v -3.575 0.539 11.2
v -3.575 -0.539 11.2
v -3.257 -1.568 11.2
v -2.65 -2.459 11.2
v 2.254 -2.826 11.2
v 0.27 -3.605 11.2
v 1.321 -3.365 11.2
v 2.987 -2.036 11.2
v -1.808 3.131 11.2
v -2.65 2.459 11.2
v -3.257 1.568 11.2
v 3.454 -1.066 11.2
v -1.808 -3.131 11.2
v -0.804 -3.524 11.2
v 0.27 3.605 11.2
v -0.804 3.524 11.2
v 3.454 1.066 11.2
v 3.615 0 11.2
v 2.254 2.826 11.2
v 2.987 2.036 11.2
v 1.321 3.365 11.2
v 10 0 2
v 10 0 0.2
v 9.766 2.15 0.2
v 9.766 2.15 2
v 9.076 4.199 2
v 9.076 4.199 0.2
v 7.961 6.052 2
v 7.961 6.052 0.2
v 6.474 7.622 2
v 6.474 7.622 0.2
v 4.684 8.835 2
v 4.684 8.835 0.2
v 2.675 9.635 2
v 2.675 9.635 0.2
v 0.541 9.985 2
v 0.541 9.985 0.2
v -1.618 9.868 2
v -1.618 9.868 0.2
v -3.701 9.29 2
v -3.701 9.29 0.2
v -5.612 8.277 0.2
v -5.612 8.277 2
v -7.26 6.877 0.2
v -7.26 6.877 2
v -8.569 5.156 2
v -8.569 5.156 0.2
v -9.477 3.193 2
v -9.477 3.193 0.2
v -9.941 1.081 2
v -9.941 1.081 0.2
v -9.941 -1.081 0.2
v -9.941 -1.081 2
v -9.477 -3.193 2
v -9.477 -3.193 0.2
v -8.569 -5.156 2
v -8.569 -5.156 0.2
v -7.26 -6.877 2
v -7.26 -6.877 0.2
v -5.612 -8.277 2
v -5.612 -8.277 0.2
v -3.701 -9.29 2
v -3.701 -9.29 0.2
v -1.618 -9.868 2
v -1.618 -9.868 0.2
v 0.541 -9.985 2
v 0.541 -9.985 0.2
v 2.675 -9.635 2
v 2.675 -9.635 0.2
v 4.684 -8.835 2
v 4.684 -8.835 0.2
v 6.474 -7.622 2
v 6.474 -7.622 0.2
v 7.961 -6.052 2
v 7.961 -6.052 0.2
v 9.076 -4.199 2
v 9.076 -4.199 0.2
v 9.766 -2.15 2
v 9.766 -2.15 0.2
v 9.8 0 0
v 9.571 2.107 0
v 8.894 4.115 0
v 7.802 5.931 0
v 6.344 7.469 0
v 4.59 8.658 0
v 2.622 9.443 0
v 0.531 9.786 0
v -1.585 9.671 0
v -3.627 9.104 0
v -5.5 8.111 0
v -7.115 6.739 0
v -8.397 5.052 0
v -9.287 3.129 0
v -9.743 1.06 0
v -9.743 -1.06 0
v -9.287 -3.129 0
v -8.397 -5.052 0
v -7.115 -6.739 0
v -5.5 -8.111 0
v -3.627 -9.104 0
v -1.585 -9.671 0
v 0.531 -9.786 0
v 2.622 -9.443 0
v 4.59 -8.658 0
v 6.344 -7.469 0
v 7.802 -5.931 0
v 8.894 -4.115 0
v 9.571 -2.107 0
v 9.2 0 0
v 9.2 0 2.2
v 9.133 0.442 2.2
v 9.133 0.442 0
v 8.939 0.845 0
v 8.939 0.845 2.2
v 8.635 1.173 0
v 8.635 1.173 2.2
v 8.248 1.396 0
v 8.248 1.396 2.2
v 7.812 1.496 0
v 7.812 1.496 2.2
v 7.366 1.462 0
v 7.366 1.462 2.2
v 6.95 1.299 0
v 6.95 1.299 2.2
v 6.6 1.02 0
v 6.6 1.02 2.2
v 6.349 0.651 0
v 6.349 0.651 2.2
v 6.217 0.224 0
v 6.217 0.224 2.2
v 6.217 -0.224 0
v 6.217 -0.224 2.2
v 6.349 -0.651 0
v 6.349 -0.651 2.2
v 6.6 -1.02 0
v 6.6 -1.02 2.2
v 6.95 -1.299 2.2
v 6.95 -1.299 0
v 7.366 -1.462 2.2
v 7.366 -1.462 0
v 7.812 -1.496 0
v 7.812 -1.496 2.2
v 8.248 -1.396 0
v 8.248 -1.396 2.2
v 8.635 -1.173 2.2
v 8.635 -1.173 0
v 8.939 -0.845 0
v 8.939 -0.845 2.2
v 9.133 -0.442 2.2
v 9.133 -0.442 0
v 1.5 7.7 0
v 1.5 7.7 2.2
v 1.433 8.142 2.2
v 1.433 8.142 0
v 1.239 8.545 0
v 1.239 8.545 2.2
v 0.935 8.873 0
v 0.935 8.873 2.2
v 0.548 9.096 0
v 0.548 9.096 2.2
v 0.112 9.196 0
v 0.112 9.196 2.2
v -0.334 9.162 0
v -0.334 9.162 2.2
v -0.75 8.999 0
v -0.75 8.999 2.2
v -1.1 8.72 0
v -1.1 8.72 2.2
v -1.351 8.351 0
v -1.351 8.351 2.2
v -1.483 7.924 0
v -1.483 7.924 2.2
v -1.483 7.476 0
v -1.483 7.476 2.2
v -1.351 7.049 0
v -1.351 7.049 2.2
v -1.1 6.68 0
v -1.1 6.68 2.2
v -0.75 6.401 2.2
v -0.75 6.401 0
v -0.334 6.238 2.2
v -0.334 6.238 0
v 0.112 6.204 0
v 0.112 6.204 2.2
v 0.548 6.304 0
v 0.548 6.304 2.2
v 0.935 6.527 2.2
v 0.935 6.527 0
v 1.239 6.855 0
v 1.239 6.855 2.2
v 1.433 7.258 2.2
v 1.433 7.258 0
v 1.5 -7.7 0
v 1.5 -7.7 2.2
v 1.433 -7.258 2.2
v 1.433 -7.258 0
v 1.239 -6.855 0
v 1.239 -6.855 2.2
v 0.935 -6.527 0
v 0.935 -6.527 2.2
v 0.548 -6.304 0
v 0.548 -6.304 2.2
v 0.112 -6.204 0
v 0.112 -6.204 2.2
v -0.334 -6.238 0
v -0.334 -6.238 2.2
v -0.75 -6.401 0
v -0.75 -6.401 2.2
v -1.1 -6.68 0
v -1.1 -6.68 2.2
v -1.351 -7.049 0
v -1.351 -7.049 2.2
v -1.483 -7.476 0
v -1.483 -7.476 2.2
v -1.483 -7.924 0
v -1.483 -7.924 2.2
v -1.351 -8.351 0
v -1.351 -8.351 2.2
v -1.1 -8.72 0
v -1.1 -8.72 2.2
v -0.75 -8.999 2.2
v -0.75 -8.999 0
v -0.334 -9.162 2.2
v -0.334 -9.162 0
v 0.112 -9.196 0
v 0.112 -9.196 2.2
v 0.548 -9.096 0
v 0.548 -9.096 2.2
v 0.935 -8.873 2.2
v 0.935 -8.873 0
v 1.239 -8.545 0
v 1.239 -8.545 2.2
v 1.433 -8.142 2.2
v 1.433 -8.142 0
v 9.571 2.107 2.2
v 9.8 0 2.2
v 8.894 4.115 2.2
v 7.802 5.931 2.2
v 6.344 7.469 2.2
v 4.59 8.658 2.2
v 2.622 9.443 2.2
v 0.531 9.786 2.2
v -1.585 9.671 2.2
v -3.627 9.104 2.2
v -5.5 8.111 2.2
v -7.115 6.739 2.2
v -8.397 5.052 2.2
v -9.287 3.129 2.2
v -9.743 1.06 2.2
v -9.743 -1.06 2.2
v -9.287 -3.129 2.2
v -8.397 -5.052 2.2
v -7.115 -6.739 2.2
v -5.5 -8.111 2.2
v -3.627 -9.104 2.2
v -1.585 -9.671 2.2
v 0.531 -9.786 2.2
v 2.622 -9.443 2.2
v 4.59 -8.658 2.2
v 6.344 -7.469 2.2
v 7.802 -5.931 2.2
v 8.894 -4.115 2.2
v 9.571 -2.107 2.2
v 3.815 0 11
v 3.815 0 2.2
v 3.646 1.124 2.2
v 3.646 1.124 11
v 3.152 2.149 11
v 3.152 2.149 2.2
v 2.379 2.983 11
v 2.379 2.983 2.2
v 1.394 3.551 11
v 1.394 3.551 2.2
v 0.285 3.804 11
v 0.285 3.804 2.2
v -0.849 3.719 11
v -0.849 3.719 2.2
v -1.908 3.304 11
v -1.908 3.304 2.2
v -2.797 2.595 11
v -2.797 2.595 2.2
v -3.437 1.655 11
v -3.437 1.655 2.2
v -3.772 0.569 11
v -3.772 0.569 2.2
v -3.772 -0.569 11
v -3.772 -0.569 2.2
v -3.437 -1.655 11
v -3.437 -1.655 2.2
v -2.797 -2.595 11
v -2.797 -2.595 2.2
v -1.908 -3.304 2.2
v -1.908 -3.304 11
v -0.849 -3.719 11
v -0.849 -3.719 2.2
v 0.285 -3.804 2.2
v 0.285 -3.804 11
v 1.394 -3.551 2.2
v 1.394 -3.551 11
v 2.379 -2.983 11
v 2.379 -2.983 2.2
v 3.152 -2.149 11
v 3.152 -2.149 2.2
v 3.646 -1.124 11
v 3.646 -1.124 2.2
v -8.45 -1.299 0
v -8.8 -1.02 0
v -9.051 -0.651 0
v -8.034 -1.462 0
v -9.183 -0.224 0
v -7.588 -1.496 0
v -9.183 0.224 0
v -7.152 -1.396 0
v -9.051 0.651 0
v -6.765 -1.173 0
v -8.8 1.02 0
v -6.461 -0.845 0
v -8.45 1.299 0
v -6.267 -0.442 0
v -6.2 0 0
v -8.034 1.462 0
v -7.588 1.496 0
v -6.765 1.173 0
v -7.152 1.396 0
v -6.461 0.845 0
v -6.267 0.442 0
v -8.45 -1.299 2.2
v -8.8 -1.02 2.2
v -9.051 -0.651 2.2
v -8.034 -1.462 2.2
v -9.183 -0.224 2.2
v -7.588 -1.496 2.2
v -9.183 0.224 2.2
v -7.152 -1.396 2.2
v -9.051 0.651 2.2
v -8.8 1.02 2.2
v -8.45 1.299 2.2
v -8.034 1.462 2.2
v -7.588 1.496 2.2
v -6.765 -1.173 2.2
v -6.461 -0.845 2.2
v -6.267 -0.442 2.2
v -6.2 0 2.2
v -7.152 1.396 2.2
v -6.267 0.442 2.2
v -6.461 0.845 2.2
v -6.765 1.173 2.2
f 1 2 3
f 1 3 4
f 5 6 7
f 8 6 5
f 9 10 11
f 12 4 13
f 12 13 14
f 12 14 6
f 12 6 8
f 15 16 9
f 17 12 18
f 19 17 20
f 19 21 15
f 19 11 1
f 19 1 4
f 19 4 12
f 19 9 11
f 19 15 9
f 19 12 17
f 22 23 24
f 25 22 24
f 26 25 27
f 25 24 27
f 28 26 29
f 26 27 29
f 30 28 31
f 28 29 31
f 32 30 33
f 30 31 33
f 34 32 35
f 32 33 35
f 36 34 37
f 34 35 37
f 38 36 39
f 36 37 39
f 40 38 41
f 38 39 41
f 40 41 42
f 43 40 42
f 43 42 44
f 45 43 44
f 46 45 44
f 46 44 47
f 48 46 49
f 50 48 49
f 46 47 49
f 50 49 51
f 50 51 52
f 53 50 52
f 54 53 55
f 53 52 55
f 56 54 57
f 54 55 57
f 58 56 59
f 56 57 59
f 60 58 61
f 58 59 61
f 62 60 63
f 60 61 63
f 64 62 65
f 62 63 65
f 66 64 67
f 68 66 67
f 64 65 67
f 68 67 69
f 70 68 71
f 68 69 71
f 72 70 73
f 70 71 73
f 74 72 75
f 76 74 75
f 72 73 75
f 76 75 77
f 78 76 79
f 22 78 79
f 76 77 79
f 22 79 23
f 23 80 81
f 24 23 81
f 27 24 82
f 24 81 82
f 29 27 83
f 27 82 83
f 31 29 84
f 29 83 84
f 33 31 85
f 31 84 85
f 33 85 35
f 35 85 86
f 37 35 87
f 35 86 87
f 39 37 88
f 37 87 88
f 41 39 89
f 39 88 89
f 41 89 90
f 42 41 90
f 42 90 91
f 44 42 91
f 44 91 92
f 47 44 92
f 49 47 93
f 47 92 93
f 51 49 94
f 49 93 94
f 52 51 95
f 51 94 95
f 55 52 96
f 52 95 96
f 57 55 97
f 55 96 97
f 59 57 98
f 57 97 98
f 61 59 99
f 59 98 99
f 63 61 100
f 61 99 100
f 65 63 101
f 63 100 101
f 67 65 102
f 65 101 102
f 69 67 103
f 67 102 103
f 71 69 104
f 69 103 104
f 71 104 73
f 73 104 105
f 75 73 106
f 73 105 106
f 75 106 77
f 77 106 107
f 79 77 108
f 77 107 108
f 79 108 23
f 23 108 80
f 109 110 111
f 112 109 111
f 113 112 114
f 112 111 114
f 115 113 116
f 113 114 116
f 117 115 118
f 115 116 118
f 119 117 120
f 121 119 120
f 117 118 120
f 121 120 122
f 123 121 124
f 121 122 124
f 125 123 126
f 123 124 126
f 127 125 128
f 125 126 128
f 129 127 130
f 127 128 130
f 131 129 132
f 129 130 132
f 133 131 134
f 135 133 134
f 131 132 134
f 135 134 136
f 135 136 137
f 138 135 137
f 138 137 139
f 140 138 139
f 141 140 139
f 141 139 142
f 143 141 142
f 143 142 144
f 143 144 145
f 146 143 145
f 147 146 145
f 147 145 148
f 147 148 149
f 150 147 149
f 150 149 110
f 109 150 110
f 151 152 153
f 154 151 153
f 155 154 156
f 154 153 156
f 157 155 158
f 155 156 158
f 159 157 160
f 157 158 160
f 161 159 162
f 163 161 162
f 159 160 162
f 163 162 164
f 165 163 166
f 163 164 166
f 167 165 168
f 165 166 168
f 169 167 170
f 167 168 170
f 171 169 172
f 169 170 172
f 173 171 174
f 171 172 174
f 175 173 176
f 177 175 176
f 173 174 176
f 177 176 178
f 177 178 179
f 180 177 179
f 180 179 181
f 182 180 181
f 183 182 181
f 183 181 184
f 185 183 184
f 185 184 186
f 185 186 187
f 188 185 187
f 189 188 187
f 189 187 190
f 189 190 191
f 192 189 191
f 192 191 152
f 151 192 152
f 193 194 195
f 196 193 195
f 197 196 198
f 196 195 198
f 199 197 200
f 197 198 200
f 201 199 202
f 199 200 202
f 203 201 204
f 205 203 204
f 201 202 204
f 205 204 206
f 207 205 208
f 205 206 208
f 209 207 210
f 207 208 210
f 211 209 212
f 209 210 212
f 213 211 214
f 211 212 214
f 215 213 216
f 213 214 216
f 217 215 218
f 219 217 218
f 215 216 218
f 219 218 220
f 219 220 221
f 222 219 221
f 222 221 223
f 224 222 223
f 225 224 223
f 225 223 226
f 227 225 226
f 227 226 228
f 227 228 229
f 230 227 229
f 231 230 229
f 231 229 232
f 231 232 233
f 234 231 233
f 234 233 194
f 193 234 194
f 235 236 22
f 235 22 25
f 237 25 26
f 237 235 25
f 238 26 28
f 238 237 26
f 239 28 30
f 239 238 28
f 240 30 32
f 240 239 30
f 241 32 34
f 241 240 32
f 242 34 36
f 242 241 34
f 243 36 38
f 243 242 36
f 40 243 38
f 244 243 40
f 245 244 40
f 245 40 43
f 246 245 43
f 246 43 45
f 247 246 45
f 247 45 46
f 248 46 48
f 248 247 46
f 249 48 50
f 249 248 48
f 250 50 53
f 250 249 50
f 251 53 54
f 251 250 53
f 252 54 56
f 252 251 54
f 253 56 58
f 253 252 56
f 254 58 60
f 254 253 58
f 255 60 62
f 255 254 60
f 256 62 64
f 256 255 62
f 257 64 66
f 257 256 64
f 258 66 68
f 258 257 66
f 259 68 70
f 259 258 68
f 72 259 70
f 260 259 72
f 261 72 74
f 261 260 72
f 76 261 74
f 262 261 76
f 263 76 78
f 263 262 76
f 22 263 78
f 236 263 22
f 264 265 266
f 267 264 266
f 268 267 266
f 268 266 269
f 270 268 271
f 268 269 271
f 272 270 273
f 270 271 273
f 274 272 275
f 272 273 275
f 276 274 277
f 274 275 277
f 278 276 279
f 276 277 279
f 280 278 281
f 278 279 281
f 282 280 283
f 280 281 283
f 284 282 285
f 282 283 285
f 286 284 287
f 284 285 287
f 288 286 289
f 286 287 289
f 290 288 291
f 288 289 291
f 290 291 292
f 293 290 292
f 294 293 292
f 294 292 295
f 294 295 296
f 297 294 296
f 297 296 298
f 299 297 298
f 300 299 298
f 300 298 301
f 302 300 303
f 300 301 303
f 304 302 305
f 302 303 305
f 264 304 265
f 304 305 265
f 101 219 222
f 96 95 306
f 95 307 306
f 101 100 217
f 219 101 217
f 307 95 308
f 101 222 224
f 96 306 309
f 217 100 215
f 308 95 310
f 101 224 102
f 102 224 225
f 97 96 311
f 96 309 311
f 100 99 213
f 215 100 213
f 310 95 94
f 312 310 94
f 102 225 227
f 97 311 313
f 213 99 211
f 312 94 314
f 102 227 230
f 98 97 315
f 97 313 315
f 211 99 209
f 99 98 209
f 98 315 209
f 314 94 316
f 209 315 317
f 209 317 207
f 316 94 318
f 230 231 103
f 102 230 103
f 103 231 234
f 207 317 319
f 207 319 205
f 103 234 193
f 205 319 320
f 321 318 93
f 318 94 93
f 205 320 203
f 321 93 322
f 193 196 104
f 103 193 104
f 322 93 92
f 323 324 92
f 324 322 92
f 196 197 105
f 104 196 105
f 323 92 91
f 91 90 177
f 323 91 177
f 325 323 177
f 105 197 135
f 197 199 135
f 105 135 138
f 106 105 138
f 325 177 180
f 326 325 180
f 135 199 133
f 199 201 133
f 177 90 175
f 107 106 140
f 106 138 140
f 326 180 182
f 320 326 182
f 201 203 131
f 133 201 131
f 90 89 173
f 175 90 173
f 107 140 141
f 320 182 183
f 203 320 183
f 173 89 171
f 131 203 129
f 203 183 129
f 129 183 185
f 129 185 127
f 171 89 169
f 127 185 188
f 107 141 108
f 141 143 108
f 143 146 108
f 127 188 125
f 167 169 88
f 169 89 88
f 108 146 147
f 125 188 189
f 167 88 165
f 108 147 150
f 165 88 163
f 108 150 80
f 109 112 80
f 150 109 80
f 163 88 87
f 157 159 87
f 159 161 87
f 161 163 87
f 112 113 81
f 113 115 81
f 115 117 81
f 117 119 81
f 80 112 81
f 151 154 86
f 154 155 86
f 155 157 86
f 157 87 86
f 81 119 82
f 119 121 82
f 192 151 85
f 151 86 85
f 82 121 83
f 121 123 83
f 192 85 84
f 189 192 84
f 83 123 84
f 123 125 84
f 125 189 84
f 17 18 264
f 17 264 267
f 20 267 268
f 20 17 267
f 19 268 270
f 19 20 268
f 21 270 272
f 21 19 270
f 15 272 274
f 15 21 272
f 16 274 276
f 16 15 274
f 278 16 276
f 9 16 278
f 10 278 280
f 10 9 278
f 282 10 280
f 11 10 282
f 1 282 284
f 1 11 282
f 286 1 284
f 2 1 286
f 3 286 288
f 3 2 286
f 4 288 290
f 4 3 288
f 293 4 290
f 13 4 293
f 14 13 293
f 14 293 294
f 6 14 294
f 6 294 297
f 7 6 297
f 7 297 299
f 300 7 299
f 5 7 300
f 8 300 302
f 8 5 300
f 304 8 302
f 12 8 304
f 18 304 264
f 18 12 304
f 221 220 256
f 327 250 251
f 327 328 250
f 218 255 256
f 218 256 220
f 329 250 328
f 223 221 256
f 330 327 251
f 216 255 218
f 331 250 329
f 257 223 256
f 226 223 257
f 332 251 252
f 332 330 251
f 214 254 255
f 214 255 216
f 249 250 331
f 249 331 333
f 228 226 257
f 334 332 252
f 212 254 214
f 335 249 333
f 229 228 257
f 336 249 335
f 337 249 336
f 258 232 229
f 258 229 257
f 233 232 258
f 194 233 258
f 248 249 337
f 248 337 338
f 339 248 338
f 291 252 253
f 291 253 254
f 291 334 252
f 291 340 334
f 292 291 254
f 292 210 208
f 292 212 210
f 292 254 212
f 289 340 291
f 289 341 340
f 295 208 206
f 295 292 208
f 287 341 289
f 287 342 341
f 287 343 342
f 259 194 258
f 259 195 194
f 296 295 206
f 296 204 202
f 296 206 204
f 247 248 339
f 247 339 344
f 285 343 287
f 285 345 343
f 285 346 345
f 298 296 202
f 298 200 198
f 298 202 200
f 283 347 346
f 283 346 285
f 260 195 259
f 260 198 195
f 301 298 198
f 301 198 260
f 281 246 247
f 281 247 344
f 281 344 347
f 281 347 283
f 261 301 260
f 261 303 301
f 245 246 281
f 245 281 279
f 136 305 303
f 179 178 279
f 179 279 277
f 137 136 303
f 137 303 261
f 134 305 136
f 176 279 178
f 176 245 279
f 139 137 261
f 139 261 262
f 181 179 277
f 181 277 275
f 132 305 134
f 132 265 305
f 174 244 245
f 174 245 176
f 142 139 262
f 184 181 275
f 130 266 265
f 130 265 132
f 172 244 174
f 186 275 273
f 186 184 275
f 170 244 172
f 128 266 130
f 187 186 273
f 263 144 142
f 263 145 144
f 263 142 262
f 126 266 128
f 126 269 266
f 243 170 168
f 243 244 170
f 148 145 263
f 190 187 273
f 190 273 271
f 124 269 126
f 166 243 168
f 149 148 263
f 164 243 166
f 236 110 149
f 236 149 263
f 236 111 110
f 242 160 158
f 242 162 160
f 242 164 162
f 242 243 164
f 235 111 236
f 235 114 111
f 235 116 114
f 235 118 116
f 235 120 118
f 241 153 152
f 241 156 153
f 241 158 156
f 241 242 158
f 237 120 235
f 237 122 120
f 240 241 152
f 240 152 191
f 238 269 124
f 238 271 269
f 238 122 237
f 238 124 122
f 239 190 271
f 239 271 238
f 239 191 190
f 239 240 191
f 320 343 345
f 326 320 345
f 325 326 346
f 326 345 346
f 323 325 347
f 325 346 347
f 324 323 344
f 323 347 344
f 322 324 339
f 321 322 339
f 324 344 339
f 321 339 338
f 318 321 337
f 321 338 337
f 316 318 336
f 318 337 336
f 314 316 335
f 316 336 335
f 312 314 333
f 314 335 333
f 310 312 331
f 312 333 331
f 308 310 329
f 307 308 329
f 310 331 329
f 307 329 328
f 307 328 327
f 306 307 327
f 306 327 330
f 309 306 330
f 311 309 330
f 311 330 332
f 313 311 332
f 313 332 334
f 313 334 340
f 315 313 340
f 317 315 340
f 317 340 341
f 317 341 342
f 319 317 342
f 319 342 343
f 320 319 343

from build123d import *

# Parameters (mm, degrees)
SKETCH1_R           = 10
BOSS_EXTRUDE1_DEPTH = 2.2
SKETCH2_R           = 1.5
CUT_EXTRUDE1_DEPTH  = 15.31223253
SKETCH2_3_R         = 3.815
BOSS_EXTRUDE2_DEPTH = 9
CHAMFER1_SIZE       = 0.2


with BuildPart() as part:
    # Sketch1 → Boss-Extrude1 (new body)
    with BuildSketch(Plane.XY):
        Circle(SKETCH1_R)
    extrude(amount=BOSS_EXTRUDE1_DEPTH)

    # Sketch2 → Cut-Extrude1 (cut, through all)
    with BuildSketch(Plane.XY.offset(2.2)):
        with Locations((0, 7.7)):
            Circle(SKETCH2_R)
        with Locations((7.7, 0)):
            Circle(SKETCH2_R)
        with Locations((0, -7.7)):
            Circle(SKETCH2_R)
        with Locations((-7.7, 0)):
            Circle(SKETCH2_R)
    extrude(amount=-CUT_EXTRUDE1_DEPTH, mode=Mode.SUBTRACT)

    # Sketch2<3> → Boss-Extrude2 (add)
    with BuildSketch(Plane.XY.offset(2.2)):
        Circle(SKETCH2_3_R)
    extrude(amount=BOSS_EXTRUDE2_DEPTH)

    # Chamfer1
    chamfer1_edges = [part.edges().sort_by_distance(p)[0] for p in [
        (-10, 0, 0),
        (-3.815, 0, 11.2),
        (-10, 0, 2.2),
    ]]
    chamfer(chamfer1_edges, length=CHAMFER1_SIZE)


solid = part.part
